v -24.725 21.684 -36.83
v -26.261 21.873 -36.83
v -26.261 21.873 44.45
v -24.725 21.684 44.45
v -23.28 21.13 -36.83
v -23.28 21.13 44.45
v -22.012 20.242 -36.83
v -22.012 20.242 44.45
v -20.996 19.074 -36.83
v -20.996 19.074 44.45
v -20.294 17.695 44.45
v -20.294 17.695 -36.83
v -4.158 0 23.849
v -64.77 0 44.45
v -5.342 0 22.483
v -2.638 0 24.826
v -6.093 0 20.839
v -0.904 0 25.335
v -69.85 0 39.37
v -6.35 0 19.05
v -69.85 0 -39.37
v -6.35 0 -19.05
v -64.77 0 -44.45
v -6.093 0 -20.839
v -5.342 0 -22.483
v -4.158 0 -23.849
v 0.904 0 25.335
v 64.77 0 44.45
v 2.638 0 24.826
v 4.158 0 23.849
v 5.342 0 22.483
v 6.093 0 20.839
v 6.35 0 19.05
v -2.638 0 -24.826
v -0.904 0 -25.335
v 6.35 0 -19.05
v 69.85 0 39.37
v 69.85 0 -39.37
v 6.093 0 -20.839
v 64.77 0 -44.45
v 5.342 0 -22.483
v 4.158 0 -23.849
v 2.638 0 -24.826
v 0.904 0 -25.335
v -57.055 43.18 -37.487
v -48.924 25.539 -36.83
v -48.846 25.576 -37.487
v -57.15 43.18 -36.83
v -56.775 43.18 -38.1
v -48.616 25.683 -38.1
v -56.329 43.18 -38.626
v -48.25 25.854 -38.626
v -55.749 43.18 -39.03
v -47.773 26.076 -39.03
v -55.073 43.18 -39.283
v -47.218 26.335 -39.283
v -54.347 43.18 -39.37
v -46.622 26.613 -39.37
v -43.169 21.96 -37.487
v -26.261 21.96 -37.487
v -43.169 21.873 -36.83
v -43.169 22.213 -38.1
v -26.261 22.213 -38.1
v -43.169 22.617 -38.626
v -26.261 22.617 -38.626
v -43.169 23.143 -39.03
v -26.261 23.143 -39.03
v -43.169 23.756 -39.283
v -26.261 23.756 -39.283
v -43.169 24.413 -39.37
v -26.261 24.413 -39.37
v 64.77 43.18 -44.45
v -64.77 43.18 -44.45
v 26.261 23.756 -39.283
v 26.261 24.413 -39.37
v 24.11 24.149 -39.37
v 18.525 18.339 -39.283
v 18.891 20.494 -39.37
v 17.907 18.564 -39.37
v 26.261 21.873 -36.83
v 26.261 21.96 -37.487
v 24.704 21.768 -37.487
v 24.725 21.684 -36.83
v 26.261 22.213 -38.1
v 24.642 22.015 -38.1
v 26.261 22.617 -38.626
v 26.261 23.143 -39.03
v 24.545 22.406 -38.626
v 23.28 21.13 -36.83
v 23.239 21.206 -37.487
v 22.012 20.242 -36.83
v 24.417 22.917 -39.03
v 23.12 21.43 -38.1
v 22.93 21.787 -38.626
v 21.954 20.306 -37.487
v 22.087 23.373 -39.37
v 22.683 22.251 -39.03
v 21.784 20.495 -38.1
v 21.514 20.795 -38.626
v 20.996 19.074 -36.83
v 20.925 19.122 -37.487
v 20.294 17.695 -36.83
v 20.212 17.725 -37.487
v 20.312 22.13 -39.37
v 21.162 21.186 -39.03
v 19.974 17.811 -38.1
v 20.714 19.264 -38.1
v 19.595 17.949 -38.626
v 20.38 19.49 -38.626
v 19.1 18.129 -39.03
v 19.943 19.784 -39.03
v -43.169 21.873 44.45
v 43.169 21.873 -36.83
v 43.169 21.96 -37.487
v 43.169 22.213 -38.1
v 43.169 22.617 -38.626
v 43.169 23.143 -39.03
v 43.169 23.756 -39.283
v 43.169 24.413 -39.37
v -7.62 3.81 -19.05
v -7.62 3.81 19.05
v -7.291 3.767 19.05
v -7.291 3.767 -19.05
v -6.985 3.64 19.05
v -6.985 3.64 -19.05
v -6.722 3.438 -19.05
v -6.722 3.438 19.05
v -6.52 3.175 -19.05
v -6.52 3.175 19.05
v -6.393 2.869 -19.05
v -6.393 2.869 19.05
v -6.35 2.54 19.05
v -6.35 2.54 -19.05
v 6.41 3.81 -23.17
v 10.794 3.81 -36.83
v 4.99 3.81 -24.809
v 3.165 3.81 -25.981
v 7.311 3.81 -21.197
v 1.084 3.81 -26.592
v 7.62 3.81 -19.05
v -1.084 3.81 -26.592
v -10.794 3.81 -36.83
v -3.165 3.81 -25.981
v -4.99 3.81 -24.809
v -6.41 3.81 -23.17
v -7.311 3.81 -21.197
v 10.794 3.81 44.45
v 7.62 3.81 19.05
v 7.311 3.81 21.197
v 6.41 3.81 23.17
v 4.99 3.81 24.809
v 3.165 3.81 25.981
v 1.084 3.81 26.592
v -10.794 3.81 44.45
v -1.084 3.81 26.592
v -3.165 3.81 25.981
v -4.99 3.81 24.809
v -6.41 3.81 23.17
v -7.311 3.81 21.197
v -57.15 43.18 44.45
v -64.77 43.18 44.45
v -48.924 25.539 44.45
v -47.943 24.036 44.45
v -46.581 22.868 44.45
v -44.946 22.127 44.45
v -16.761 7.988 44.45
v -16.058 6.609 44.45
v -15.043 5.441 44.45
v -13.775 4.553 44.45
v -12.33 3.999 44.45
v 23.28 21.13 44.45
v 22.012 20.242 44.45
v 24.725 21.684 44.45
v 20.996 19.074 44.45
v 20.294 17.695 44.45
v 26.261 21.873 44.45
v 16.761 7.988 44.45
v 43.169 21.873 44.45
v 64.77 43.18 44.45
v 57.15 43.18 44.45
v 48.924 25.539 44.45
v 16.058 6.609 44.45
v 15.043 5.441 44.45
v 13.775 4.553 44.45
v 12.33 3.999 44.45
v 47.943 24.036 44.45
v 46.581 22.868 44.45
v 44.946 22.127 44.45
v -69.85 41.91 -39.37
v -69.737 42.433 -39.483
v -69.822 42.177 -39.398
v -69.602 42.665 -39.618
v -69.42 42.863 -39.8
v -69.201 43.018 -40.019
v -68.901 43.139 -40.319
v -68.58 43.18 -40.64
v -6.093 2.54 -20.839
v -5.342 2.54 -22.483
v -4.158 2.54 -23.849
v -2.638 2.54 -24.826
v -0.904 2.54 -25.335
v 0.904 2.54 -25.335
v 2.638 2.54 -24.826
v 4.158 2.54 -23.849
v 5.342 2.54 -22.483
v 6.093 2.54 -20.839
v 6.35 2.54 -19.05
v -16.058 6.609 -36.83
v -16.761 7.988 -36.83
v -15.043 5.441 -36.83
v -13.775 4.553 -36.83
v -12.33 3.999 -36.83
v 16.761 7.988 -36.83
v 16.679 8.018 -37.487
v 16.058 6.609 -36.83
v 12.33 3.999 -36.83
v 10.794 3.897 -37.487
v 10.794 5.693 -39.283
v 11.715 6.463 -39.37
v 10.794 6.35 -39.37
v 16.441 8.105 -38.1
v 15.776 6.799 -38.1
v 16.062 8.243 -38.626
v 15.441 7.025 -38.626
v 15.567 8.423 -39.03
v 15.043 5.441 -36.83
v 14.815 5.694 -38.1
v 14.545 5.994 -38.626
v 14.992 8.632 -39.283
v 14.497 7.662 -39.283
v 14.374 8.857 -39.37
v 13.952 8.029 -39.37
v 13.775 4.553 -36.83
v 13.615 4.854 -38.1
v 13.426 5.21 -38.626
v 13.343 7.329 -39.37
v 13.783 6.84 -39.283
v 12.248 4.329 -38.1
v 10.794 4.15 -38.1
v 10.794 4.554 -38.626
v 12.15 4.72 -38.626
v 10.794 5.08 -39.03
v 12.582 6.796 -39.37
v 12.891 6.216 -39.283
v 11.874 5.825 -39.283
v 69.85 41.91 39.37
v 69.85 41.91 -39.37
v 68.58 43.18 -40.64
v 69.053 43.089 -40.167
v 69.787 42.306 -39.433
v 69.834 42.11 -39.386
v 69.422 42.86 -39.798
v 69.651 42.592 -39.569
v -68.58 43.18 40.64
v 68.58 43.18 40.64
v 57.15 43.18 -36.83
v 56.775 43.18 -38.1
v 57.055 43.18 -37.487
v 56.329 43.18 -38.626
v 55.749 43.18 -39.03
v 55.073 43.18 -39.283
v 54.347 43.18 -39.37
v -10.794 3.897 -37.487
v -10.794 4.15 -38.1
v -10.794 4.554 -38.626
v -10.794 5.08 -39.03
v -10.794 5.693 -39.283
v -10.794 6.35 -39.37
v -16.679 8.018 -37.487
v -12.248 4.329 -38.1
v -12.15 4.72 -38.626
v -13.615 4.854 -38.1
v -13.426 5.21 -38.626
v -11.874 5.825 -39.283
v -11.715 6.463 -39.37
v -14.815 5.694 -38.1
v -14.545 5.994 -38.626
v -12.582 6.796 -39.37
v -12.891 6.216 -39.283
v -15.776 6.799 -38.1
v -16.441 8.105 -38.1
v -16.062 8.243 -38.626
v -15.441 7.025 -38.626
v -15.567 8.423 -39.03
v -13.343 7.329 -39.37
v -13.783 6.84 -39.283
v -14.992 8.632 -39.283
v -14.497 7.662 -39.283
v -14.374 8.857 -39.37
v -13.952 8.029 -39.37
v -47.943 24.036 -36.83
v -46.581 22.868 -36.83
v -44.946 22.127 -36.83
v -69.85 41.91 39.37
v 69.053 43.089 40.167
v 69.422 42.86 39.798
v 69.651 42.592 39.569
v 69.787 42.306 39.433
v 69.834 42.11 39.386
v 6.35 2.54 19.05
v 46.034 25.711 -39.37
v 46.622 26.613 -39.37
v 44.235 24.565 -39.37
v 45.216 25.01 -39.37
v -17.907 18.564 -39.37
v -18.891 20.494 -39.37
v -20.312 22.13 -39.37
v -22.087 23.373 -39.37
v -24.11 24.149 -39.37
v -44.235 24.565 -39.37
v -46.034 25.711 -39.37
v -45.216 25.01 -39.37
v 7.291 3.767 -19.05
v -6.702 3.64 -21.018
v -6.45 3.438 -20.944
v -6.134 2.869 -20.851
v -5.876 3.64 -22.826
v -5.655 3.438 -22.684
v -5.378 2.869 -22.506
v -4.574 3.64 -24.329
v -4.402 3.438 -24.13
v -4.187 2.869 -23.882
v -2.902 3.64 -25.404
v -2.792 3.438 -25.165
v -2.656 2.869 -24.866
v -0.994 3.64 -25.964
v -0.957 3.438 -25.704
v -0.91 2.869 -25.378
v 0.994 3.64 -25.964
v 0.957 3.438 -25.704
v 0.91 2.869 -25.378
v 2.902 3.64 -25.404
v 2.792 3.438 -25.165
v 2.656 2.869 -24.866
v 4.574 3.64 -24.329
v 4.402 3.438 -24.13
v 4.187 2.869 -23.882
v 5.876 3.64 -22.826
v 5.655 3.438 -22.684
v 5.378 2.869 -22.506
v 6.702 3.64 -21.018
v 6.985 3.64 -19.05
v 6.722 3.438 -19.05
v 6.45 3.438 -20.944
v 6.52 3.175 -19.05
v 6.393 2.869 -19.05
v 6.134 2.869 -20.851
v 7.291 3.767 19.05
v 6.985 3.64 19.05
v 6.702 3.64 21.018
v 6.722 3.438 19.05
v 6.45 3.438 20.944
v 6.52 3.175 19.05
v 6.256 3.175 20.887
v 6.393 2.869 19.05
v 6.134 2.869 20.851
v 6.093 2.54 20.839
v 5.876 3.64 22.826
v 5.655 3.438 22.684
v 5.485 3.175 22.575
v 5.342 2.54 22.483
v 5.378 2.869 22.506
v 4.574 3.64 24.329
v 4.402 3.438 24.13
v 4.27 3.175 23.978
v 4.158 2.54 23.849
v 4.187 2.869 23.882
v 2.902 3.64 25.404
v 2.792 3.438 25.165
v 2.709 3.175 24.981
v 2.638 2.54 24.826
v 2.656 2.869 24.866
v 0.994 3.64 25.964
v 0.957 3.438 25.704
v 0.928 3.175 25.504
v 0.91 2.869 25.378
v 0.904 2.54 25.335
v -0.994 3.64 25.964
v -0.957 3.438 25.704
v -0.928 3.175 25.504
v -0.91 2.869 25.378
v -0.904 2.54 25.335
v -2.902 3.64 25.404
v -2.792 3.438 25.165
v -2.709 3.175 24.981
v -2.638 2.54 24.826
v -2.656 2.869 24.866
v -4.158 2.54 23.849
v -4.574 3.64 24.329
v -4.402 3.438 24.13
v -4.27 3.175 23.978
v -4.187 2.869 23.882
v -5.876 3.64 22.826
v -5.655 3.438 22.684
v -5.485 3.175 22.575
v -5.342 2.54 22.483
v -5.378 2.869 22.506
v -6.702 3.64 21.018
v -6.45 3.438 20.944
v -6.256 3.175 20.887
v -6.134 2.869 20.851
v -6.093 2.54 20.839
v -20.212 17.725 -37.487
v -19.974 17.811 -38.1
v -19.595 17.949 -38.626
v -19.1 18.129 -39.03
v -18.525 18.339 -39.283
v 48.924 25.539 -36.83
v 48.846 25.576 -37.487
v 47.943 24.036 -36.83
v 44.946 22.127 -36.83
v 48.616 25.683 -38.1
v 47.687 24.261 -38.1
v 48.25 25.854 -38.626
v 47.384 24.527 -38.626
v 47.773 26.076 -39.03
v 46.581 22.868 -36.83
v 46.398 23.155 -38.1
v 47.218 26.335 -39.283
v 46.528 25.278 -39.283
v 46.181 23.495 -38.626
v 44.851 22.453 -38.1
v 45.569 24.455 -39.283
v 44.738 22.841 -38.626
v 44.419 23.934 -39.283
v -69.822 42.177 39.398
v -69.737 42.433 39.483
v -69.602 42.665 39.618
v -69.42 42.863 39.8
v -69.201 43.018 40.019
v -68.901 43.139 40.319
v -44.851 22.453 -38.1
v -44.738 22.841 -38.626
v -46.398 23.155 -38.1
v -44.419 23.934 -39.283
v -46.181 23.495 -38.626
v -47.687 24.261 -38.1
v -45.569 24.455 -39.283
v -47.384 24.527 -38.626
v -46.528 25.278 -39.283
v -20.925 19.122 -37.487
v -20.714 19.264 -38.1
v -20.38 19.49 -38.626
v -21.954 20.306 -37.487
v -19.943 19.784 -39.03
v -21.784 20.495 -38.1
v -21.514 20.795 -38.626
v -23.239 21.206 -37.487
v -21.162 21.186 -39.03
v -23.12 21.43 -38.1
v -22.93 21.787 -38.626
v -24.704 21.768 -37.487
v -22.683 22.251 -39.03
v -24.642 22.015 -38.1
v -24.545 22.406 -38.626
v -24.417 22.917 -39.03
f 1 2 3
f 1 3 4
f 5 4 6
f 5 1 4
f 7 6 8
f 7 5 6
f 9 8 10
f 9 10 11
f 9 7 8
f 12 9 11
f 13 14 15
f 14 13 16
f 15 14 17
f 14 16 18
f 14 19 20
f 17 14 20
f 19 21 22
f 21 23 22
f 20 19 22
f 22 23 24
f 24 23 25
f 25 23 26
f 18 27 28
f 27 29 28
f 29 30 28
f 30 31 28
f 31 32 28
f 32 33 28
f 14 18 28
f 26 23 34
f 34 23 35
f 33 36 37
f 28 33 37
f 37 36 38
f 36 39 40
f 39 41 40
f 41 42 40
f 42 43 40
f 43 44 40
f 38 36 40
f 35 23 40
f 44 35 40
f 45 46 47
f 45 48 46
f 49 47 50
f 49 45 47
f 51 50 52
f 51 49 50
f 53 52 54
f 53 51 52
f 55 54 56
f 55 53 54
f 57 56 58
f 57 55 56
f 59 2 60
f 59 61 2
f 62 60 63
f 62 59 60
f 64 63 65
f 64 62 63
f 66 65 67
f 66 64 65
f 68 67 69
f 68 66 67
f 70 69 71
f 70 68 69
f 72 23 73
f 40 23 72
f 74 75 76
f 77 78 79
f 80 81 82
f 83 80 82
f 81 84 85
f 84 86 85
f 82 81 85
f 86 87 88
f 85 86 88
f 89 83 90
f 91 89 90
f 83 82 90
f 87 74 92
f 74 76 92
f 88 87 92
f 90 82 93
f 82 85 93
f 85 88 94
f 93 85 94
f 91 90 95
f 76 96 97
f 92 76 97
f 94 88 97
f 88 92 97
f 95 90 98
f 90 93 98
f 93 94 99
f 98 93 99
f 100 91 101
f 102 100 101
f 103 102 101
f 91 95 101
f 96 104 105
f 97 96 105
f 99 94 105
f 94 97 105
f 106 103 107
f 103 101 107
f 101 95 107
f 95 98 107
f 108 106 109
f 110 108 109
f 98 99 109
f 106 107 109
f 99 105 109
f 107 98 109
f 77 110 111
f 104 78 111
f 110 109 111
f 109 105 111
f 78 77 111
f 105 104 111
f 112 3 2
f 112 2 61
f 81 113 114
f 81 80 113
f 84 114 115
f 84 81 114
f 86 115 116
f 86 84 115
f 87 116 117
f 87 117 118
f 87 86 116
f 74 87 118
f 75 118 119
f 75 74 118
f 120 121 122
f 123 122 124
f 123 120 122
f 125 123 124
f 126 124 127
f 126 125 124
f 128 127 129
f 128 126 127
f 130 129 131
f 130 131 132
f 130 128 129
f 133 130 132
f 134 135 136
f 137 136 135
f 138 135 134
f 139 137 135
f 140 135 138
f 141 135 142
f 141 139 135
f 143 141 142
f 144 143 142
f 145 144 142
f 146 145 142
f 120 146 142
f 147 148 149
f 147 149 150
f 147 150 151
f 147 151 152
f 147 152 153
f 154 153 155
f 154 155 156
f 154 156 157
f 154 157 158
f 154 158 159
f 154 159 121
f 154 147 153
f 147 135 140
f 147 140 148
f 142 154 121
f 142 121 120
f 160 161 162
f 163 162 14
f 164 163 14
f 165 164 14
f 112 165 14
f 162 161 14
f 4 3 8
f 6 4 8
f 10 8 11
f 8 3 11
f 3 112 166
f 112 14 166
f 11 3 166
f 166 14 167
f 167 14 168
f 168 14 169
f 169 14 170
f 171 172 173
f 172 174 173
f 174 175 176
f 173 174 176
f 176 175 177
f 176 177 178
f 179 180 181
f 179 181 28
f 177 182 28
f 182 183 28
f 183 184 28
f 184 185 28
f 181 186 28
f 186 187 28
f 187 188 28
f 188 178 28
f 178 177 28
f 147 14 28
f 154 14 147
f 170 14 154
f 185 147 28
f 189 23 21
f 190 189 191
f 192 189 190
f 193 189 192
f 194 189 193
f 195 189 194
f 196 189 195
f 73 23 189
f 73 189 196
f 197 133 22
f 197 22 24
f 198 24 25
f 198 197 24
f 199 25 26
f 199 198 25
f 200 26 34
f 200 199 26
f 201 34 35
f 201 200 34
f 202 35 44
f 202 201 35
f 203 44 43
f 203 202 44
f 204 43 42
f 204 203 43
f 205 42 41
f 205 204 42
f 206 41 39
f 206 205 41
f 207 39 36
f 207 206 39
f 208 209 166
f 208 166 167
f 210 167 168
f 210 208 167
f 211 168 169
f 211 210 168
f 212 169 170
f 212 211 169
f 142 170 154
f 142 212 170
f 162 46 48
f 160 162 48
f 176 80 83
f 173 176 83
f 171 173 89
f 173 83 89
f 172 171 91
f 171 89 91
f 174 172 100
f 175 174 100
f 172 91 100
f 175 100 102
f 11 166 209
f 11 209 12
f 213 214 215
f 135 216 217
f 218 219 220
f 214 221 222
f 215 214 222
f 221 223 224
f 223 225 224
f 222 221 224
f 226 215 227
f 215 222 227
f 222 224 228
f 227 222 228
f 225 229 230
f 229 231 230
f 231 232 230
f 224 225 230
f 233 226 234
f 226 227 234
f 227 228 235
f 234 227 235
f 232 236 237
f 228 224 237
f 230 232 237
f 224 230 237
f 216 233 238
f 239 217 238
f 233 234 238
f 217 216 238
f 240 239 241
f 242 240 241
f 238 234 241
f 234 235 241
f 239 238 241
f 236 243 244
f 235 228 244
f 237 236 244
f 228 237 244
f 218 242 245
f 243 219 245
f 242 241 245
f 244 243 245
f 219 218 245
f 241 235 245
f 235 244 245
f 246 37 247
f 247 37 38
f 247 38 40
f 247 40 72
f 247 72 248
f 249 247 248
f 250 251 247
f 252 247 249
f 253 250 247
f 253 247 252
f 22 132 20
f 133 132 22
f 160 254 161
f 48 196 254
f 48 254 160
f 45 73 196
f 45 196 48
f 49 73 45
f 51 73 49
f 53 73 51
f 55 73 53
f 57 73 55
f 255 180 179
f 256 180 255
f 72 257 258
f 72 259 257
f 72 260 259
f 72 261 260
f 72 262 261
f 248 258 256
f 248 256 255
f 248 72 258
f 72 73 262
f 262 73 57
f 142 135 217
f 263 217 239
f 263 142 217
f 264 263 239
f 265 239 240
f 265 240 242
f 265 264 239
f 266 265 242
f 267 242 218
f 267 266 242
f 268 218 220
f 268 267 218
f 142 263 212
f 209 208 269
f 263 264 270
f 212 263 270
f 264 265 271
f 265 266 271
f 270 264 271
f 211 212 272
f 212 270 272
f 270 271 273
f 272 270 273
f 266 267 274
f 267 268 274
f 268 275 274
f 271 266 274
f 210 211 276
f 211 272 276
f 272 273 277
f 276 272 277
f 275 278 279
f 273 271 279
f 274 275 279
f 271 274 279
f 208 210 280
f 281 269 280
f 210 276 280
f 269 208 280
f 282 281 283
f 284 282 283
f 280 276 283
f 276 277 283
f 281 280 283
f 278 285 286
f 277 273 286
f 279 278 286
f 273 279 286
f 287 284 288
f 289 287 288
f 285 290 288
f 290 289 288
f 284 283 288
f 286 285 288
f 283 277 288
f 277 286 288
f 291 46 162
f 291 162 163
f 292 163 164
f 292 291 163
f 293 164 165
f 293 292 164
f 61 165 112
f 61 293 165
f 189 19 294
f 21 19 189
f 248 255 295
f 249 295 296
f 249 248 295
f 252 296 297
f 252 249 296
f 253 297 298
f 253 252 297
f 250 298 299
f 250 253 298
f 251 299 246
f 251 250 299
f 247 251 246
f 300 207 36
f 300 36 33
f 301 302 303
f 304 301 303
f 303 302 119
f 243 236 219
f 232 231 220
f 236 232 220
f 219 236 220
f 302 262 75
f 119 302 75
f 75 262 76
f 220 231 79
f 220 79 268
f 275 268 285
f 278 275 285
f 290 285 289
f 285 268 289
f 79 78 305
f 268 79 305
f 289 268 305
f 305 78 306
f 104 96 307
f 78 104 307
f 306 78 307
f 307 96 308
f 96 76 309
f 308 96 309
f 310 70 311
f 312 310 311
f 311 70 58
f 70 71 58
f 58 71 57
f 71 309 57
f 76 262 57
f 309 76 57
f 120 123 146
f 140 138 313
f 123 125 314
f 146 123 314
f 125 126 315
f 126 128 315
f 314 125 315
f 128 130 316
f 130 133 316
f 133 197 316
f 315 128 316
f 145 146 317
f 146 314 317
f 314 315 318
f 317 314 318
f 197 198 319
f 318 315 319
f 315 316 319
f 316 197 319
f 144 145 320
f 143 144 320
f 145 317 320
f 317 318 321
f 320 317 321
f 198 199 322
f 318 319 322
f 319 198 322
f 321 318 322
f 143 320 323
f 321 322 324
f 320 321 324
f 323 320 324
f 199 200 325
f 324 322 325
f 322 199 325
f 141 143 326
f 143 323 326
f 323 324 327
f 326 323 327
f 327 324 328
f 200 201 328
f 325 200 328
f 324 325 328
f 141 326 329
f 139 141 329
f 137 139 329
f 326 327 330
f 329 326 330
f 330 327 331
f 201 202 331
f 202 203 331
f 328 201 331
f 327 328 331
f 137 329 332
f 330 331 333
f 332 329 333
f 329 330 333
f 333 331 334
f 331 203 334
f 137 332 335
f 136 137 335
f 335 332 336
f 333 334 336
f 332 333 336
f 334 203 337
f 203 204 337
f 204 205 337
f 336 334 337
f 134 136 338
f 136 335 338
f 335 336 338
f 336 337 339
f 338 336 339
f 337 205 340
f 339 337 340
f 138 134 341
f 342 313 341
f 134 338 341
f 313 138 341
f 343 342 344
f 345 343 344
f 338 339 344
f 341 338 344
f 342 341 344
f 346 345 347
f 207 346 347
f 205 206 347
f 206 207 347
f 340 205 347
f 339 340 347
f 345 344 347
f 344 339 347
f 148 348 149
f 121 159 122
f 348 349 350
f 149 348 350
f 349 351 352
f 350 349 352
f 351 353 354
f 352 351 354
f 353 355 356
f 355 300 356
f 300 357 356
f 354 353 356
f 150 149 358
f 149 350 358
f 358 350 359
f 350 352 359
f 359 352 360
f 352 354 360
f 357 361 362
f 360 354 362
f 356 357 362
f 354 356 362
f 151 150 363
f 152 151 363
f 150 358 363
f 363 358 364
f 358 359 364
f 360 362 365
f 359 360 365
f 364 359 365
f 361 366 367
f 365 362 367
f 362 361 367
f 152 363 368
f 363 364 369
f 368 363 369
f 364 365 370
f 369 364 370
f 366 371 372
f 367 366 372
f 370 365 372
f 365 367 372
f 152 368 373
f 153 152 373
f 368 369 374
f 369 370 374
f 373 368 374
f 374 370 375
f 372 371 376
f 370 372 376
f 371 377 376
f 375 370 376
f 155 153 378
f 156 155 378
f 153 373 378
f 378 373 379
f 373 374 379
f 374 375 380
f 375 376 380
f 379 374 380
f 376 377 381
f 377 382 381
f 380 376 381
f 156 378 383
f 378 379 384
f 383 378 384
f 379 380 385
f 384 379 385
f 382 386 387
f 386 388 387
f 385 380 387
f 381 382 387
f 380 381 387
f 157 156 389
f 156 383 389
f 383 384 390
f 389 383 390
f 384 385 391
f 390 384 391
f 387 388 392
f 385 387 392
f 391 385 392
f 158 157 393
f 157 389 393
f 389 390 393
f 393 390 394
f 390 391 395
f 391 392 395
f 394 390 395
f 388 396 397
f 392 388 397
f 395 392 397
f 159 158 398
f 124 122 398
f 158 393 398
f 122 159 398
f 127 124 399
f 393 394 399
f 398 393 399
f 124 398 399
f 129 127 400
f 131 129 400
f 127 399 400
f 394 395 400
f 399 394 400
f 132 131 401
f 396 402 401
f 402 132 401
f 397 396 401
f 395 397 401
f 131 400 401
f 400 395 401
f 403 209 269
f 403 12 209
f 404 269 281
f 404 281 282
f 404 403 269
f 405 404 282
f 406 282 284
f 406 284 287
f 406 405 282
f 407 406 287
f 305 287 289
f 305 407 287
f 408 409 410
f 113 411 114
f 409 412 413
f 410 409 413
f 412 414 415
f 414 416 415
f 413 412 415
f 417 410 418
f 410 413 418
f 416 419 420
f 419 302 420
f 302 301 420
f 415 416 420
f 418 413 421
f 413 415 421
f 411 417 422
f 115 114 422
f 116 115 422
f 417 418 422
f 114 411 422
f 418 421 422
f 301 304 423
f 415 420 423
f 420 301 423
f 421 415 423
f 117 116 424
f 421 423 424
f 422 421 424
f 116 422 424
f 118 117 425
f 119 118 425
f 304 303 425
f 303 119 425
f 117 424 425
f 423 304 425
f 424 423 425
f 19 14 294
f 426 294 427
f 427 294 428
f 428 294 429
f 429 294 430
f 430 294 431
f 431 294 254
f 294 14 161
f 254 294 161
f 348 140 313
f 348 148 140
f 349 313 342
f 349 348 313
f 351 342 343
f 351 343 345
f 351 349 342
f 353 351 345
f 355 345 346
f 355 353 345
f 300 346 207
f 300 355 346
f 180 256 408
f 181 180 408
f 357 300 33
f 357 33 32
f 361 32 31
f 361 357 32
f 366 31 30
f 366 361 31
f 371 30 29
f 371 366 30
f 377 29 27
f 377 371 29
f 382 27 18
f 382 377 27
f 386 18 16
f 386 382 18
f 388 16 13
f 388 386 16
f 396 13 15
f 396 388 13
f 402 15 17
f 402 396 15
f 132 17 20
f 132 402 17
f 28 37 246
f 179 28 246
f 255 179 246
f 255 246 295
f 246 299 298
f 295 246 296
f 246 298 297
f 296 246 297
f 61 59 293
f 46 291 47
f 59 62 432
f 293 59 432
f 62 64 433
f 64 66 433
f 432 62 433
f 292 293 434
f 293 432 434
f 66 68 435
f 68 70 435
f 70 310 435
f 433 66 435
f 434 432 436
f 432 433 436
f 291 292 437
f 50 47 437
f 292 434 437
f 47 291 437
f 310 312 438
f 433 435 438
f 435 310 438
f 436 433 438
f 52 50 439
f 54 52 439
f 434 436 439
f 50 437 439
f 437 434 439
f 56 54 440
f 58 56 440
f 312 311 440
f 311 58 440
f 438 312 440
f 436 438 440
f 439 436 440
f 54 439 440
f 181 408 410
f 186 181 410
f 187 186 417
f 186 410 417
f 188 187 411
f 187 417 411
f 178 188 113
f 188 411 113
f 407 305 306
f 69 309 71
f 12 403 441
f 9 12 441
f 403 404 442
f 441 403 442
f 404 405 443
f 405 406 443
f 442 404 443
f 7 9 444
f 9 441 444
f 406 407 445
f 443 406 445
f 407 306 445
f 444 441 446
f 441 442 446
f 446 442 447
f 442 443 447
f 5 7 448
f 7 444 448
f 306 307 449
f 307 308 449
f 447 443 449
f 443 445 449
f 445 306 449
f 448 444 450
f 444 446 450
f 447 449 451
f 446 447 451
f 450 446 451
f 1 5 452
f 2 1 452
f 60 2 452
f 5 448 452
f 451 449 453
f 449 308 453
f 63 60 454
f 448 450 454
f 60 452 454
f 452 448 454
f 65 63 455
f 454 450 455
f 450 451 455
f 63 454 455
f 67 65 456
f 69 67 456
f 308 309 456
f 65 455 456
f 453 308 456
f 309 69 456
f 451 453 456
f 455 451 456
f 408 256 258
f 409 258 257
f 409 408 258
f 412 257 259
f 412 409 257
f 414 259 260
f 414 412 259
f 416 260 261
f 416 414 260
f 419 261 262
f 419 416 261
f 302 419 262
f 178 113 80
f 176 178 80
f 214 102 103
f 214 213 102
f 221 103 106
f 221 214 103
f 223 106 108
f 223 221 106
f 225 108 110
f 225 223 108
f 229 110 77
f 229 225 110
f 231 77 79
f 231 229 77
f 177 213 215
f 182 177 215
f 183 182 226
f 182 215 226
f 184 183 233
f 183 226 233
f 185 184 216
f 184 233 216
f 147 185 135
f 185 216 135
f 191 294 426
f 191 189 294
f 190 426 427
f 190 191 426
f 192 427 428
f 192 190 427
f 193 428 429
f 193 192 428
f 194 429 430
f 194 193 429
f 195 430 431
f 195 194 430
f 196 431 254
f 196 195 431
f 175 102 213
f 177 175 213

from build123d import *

# Parameters (mm, degrees)
SKETCH3_W           = 139.7
SKETCH3_H           = 88.9
BOSS_EXTRUDE2_DEPTH = 43.18
CUT_EXTRUDE1_DEPTH  = 83.82
CUT_EXTRUDE2_DEPTH  = 94.377392339
CHAMFER1_SIZE       = 5.08
FILLET1_R           = 1.27
FILLET2_R           = 6.35
FILLET3_R           = 2.54
FILLET4_R           = 1.27


with BuildPart() as part:
    # Sketch3 → Boss-Extrude2 (new body)
    with BuildSketch(Plane(origin=(0, 0, 0), x_dir=(1, 0, 0), z_dir=(0, 1, 0))):
        Rectangle(SKETCH3_W, SKETCH3_H)
    extrude(amount=BOSS_EXTRUDE2_DEPTH)

    # Sketch4 → Cut-Extrude1 (cut)
    with BuildSketch(Plane.XY.offset(44.45)):
        Polygon((-57.15, 43.18), (57.15, 43.18), (47.214435647, 21.873113486), (21.814435647, 21.873113486), (15.24, 3.81), (-15.24, 3.81), (-21.814435647, 21.873113486), (-47.214435647, 21.873113486), align=None)
    extrude(amount=-CUT_EXTRUDE1_DEPTH, mode=Mode.SUBTRACT)

    # Sketch6 → Cut-Extrude2 (cut, through all)
    with BuildSketch(Plane(origin=(0, 43.18, 0), x_dir=(1, 0, 0), z_dir=(0, 1, 0))):
        with BuildLine():
            Line((-6.35, -19.05), (-6.35, 19.05))
            ThreePointArc((-6.35, 19.05), (0, 25.4), (6.35, 19.05))
            Line((6.35, 19.05), (6.35, -19.05))
            ThreePointArc((6.35, -19.05), (0, -25.4), (-6.35, -19.05))
        make_face()
    extrude(amount=-CUT_EXTRUDE2_DEPTH, mode=Mode.SUBTRACT)

    # Chamfer1
    chamfer1_edges = [part.edges().sort_by_distance(p)[0] for p in [
        (69.85, 21.59, 44.45),
        (-69.85, 21.59, 44.45),
        (-69.85, 21.59, -44.45),
        (69.85, 21.59, -44.45),
    ]]
    chamfer(chamfer1_edges, length=CHAMFER1_SIZE)

    # Fillet1
    fillet1_edges = [part.edges().sort_by_distance(p)[0] for p in [
        (-69.85, 43.18, 0),
        (69.85, 43.18, 0),
    ]]
    fillet(fillet1_edges, radius=FILLET1_R)

    # Fillet2
    fillet2_edges = [part.edges().sort_by_distance(p)[0] for p in [
        (-47.214435647, 21.873113486, 2.54),
        (47.214435647, 21.873113486, 2.54),
        (21.814435647, 21.873113486, 2.54),
        (15.24, 3.81, 2.54),
        (-15.24, 3.81, 2.54),
        (-21.814435647, 21.873113486, 2.54),
    ]]
    fillet(fillet2_edges, radius=FILLET2_R)

    # Fillet3
    fillet3_edges = [part.edges().sort_by_distance(p)[0] for p in [
        (53.037046969, 34.359743762, -39.37),
        (34.714896503, 21.873113486, -39.37),
        (-34.714896503, 21.873113486, -39.37),
        (-18.527217824, 12.841556743, -39.37),
        (0, 3.81, -39.37),
        (18.527217824, 12.841556743, -39.37),
        (-46.580892004, 22.867577805, -39.37),
        (-14.435892503, 4.958384519, -39.37),
        (14.435892503, 4.958384519, -39.37),
        (46.580892004, 22.867577805, -39.37),
        (22.618543144, 20.724728967, -39.37),
        (-22.618543144, 20.724728967, -39.37),
        (-53.037046969, 34.359743762, -39.37),
    ]]
    fillet(fillet3_edges, radius=FILLET3_R)

    # Fillet4
    fillet4_edges = [part.edges().sort_by_distance(p)[0] for p in [
        (6.35, 3.81, 0),
        (0, 3.81, -25.4),
        (-6.35, 3.81, 0),
        (0, 3.81, 25.4),
    ]]
    fillet(fillet4_edges, radius=FILLET4_R)


solid = part.part
